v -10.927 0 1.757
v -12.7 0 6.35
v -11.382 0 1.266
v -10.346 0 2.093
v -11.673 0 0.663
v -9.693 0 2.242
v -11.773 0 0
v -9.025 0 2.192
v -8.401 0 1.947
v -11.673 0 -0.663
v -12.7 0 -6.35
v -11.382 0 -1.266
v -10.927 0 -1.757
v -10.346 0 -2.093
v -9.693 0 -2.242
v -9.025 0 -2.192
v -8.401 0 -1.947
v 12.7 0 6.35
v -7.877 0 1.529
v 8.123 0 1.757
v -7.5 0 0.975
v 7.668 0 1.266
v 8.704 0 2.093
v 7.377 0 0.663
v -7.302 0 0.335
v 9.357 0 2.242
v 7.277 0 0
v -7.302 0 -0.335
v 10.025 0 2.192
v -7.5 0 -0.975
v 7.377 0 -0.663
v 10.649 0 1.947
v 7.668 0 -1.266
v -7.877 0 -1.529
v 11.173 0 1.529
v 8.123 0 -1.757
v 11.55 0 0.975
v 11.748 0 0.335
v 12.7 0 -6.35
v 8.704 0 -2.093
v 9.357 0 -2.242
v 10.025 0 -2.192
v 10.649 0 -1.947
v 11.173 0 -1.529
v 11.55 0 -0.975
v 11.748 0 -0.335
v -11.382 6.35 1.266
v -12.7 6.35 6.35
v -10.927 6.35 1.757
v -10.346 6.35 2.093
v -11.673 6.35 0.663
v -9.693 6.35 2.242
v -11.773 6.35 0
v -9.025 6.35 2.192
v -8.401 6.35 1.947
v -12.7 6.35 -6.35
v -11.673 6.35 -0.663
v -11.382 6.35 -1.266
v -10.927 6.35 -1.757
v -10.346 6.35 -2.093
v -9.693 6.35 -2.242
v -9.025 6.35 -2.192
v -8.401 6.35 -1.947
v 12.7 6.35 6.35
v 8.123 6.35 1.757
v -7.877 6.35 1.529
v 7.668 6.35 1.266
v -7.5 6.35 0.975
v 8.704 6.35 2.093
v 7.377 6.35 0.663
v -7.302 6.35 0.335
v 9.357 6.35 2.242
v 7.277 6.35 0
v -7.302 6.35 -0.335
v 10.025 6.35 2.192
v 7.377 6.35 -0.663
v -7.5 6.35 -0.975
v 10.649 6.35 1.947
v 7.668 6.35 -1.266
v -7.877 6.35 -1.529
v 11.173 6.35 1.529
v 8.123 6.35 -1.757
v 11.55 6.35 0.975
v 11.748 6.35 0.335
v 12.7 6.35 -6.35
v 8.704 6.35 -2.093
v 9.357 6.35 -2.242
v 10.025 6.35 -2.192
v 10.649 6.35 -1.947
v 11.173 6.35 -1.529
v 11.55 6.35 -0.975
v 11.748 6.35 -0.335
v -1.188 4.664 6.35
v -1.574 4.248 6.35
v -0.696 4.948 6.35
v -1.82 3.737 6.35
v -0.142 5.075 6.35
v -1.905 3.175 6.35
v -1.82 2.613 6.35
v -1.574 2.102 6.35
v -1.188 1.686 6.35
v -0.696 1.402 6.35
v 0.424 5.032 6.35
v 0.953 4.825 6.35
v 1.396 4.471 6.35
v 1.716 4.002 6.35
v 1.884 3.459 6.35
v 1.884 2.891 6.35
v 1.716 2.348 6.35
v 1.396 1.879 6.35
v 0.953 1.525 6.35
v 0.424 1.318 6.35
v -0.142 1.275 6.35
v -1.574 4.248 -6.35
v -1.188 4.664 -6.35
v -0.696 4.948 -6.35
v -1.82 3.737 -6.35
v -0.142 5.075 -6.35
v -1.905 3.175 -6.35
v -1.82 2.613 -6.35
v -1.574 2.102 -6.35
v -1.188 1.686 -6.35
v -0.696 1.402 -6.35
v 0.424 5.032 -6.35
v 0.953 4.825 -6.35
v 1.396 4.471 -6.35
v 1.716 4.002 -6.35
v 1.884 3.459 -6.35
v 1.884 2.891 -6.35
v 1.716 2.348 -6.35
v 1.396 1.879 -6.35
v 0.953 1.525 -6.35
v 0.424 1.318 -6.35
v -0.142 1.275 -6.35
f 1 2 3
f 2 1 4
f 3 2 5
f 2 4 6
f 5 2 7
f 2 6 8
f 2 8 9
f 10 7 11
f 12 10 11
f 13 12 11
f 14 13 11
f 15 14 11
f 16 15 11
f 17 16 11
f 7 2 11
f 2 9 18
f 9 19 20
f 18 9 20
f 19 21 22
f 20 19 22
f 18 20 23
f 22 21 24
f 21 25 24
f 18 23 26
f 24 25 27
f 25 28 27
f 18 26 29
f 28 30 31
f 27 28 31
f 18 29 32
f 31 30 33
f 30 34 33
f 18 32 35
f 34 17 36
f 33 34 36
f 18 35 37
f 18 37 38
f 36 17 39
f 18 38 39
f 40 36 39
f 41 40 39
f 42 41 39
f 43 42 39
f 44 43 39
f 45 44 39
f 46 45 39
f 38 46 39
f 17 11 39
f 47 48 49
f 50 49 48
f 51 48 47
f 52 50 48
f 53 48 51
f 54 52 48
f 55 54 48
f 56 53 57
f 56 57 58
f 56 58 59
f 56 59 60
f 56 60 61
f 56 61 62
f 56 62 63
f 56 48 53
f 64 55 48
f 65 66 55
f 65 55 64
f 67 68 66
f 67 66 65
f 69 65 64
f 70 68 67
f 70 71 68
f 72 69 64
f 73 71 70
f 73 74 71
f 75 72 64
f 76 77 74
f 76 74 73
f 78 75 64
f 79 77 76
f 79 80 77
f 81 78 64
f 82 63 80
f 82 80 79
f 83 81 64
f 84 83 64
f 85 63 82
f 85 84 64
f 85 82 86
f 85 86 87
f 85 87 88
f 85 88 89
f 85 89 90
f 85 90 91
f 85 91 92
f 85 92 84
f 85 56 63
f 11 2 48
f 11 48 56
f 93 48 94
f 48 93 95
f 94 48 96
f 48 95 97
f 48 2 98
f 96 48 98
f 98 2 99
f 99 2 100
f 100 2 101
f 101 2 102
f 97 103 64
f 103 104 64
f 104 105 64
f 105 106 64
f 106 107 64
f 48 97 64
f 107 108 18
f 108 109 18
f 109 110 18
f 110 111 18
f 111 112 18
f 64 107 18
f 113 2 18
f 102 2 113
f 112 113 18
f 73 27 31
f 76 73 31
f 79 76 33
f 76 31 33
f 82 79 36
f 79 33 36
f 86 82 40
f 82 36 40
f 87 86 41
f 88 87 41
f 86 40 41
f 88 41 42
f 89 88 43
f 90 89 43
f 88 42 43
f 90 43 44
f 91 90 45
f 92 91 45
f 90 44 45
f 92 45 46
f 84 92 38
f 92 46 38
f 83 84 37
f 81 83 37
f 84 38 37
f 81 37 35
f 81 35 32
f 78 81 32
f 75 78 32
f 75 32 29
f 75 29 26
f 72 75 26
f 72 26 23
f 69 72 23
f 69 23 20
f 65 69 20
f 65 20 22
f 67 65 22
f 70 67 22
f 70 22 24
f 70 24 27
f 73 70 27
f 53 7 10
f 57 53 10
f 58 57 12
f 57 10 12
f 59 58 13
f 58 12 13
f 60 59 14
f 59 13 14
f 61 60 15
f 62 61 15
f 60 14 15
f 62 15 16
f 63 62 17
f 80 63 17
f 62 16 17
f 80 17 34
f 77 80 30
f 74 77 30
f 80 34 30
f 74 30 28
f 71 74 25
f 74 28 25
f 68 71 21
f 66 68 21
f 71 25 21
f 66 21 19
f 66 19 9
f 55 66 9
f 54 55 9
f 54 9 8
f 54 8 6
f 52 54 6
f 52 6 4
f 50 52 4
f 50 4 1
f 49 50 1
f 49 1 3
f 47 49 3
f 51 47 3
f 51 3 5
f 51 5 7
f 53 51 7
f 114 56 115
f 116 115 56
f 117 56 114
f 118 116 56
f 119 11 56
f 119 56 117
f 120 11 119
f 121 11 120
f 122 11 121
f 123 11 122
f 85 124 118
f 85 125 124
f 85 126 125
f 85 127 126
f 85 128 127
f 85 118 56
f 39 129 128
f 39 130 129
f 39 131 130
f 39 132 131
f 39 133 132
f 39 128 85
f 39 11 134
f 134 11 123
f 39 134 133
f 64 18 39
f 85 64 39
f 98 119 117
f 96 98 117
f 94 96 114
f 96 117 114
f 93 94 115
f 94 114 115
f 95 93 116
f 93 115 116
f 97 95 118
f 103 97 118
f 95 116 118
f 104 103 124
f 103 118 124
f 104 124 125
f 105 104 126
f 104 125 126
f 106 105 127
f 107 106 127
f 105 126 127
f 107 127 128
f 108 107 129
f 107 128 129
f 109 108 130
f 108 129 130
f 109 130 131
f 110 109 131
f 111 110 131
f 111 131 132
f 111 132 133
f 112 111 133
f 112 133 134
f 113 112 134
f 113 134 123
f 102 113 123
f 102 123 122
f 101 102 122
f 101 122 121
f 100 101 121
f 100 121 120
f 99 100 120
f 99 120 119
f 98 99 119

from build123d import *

# Parameters (mm, degrees)
SKETCH1_W             = 25.4
SKETCH1_H             = 12.7
BOSS_EXTRUDE1_DEPTH   = 6.35
SKETCH2_R             = 1.905
CUT_EXTRUDE1_DEPTH    = 20.05
F_8_CLEARANCE_HOLE1_D = 4.4958


with BuildPart() as part:
    # Sketch1 → Boss-Extrude1 (new body)
    with BuildSketch(Plane(origin=(0, 0, 0), x_dir=(1, 0, 0), z_dir=(0, 1, 0))):
        Rectangle(SKETCH1_W, SKETCH1_H)
    extrude(amount=BOSS_EXTRUDE1_DEPTH)

    # Sketch2 → Cut-Extrude1 (cut, through all)
    with BuildSketch(Plane(origin=(0, 0, -6.35), x_dir=(-1, 0, 0), z_dir=(0, 0, -1))):
        with Locations((0, 3.175)):
            Circle(SKETCH2_R)
    extrude(amount=-CUT_EXTRUDE1_DEPTH, mode=Mode.SUBTRACT)

    # #8 Clearance Hole1 (through all)
    with Locations(Plane(origin=(0, 6.35, 0), x_dir=(1, 0, 0), z_dir=(0, 1, 0))):
        with Locations((9.525, 0), (-9.525, 0)):
            Hole(F_8_CLEARANCE_HOLE1_D / 2)


solid = part.part
